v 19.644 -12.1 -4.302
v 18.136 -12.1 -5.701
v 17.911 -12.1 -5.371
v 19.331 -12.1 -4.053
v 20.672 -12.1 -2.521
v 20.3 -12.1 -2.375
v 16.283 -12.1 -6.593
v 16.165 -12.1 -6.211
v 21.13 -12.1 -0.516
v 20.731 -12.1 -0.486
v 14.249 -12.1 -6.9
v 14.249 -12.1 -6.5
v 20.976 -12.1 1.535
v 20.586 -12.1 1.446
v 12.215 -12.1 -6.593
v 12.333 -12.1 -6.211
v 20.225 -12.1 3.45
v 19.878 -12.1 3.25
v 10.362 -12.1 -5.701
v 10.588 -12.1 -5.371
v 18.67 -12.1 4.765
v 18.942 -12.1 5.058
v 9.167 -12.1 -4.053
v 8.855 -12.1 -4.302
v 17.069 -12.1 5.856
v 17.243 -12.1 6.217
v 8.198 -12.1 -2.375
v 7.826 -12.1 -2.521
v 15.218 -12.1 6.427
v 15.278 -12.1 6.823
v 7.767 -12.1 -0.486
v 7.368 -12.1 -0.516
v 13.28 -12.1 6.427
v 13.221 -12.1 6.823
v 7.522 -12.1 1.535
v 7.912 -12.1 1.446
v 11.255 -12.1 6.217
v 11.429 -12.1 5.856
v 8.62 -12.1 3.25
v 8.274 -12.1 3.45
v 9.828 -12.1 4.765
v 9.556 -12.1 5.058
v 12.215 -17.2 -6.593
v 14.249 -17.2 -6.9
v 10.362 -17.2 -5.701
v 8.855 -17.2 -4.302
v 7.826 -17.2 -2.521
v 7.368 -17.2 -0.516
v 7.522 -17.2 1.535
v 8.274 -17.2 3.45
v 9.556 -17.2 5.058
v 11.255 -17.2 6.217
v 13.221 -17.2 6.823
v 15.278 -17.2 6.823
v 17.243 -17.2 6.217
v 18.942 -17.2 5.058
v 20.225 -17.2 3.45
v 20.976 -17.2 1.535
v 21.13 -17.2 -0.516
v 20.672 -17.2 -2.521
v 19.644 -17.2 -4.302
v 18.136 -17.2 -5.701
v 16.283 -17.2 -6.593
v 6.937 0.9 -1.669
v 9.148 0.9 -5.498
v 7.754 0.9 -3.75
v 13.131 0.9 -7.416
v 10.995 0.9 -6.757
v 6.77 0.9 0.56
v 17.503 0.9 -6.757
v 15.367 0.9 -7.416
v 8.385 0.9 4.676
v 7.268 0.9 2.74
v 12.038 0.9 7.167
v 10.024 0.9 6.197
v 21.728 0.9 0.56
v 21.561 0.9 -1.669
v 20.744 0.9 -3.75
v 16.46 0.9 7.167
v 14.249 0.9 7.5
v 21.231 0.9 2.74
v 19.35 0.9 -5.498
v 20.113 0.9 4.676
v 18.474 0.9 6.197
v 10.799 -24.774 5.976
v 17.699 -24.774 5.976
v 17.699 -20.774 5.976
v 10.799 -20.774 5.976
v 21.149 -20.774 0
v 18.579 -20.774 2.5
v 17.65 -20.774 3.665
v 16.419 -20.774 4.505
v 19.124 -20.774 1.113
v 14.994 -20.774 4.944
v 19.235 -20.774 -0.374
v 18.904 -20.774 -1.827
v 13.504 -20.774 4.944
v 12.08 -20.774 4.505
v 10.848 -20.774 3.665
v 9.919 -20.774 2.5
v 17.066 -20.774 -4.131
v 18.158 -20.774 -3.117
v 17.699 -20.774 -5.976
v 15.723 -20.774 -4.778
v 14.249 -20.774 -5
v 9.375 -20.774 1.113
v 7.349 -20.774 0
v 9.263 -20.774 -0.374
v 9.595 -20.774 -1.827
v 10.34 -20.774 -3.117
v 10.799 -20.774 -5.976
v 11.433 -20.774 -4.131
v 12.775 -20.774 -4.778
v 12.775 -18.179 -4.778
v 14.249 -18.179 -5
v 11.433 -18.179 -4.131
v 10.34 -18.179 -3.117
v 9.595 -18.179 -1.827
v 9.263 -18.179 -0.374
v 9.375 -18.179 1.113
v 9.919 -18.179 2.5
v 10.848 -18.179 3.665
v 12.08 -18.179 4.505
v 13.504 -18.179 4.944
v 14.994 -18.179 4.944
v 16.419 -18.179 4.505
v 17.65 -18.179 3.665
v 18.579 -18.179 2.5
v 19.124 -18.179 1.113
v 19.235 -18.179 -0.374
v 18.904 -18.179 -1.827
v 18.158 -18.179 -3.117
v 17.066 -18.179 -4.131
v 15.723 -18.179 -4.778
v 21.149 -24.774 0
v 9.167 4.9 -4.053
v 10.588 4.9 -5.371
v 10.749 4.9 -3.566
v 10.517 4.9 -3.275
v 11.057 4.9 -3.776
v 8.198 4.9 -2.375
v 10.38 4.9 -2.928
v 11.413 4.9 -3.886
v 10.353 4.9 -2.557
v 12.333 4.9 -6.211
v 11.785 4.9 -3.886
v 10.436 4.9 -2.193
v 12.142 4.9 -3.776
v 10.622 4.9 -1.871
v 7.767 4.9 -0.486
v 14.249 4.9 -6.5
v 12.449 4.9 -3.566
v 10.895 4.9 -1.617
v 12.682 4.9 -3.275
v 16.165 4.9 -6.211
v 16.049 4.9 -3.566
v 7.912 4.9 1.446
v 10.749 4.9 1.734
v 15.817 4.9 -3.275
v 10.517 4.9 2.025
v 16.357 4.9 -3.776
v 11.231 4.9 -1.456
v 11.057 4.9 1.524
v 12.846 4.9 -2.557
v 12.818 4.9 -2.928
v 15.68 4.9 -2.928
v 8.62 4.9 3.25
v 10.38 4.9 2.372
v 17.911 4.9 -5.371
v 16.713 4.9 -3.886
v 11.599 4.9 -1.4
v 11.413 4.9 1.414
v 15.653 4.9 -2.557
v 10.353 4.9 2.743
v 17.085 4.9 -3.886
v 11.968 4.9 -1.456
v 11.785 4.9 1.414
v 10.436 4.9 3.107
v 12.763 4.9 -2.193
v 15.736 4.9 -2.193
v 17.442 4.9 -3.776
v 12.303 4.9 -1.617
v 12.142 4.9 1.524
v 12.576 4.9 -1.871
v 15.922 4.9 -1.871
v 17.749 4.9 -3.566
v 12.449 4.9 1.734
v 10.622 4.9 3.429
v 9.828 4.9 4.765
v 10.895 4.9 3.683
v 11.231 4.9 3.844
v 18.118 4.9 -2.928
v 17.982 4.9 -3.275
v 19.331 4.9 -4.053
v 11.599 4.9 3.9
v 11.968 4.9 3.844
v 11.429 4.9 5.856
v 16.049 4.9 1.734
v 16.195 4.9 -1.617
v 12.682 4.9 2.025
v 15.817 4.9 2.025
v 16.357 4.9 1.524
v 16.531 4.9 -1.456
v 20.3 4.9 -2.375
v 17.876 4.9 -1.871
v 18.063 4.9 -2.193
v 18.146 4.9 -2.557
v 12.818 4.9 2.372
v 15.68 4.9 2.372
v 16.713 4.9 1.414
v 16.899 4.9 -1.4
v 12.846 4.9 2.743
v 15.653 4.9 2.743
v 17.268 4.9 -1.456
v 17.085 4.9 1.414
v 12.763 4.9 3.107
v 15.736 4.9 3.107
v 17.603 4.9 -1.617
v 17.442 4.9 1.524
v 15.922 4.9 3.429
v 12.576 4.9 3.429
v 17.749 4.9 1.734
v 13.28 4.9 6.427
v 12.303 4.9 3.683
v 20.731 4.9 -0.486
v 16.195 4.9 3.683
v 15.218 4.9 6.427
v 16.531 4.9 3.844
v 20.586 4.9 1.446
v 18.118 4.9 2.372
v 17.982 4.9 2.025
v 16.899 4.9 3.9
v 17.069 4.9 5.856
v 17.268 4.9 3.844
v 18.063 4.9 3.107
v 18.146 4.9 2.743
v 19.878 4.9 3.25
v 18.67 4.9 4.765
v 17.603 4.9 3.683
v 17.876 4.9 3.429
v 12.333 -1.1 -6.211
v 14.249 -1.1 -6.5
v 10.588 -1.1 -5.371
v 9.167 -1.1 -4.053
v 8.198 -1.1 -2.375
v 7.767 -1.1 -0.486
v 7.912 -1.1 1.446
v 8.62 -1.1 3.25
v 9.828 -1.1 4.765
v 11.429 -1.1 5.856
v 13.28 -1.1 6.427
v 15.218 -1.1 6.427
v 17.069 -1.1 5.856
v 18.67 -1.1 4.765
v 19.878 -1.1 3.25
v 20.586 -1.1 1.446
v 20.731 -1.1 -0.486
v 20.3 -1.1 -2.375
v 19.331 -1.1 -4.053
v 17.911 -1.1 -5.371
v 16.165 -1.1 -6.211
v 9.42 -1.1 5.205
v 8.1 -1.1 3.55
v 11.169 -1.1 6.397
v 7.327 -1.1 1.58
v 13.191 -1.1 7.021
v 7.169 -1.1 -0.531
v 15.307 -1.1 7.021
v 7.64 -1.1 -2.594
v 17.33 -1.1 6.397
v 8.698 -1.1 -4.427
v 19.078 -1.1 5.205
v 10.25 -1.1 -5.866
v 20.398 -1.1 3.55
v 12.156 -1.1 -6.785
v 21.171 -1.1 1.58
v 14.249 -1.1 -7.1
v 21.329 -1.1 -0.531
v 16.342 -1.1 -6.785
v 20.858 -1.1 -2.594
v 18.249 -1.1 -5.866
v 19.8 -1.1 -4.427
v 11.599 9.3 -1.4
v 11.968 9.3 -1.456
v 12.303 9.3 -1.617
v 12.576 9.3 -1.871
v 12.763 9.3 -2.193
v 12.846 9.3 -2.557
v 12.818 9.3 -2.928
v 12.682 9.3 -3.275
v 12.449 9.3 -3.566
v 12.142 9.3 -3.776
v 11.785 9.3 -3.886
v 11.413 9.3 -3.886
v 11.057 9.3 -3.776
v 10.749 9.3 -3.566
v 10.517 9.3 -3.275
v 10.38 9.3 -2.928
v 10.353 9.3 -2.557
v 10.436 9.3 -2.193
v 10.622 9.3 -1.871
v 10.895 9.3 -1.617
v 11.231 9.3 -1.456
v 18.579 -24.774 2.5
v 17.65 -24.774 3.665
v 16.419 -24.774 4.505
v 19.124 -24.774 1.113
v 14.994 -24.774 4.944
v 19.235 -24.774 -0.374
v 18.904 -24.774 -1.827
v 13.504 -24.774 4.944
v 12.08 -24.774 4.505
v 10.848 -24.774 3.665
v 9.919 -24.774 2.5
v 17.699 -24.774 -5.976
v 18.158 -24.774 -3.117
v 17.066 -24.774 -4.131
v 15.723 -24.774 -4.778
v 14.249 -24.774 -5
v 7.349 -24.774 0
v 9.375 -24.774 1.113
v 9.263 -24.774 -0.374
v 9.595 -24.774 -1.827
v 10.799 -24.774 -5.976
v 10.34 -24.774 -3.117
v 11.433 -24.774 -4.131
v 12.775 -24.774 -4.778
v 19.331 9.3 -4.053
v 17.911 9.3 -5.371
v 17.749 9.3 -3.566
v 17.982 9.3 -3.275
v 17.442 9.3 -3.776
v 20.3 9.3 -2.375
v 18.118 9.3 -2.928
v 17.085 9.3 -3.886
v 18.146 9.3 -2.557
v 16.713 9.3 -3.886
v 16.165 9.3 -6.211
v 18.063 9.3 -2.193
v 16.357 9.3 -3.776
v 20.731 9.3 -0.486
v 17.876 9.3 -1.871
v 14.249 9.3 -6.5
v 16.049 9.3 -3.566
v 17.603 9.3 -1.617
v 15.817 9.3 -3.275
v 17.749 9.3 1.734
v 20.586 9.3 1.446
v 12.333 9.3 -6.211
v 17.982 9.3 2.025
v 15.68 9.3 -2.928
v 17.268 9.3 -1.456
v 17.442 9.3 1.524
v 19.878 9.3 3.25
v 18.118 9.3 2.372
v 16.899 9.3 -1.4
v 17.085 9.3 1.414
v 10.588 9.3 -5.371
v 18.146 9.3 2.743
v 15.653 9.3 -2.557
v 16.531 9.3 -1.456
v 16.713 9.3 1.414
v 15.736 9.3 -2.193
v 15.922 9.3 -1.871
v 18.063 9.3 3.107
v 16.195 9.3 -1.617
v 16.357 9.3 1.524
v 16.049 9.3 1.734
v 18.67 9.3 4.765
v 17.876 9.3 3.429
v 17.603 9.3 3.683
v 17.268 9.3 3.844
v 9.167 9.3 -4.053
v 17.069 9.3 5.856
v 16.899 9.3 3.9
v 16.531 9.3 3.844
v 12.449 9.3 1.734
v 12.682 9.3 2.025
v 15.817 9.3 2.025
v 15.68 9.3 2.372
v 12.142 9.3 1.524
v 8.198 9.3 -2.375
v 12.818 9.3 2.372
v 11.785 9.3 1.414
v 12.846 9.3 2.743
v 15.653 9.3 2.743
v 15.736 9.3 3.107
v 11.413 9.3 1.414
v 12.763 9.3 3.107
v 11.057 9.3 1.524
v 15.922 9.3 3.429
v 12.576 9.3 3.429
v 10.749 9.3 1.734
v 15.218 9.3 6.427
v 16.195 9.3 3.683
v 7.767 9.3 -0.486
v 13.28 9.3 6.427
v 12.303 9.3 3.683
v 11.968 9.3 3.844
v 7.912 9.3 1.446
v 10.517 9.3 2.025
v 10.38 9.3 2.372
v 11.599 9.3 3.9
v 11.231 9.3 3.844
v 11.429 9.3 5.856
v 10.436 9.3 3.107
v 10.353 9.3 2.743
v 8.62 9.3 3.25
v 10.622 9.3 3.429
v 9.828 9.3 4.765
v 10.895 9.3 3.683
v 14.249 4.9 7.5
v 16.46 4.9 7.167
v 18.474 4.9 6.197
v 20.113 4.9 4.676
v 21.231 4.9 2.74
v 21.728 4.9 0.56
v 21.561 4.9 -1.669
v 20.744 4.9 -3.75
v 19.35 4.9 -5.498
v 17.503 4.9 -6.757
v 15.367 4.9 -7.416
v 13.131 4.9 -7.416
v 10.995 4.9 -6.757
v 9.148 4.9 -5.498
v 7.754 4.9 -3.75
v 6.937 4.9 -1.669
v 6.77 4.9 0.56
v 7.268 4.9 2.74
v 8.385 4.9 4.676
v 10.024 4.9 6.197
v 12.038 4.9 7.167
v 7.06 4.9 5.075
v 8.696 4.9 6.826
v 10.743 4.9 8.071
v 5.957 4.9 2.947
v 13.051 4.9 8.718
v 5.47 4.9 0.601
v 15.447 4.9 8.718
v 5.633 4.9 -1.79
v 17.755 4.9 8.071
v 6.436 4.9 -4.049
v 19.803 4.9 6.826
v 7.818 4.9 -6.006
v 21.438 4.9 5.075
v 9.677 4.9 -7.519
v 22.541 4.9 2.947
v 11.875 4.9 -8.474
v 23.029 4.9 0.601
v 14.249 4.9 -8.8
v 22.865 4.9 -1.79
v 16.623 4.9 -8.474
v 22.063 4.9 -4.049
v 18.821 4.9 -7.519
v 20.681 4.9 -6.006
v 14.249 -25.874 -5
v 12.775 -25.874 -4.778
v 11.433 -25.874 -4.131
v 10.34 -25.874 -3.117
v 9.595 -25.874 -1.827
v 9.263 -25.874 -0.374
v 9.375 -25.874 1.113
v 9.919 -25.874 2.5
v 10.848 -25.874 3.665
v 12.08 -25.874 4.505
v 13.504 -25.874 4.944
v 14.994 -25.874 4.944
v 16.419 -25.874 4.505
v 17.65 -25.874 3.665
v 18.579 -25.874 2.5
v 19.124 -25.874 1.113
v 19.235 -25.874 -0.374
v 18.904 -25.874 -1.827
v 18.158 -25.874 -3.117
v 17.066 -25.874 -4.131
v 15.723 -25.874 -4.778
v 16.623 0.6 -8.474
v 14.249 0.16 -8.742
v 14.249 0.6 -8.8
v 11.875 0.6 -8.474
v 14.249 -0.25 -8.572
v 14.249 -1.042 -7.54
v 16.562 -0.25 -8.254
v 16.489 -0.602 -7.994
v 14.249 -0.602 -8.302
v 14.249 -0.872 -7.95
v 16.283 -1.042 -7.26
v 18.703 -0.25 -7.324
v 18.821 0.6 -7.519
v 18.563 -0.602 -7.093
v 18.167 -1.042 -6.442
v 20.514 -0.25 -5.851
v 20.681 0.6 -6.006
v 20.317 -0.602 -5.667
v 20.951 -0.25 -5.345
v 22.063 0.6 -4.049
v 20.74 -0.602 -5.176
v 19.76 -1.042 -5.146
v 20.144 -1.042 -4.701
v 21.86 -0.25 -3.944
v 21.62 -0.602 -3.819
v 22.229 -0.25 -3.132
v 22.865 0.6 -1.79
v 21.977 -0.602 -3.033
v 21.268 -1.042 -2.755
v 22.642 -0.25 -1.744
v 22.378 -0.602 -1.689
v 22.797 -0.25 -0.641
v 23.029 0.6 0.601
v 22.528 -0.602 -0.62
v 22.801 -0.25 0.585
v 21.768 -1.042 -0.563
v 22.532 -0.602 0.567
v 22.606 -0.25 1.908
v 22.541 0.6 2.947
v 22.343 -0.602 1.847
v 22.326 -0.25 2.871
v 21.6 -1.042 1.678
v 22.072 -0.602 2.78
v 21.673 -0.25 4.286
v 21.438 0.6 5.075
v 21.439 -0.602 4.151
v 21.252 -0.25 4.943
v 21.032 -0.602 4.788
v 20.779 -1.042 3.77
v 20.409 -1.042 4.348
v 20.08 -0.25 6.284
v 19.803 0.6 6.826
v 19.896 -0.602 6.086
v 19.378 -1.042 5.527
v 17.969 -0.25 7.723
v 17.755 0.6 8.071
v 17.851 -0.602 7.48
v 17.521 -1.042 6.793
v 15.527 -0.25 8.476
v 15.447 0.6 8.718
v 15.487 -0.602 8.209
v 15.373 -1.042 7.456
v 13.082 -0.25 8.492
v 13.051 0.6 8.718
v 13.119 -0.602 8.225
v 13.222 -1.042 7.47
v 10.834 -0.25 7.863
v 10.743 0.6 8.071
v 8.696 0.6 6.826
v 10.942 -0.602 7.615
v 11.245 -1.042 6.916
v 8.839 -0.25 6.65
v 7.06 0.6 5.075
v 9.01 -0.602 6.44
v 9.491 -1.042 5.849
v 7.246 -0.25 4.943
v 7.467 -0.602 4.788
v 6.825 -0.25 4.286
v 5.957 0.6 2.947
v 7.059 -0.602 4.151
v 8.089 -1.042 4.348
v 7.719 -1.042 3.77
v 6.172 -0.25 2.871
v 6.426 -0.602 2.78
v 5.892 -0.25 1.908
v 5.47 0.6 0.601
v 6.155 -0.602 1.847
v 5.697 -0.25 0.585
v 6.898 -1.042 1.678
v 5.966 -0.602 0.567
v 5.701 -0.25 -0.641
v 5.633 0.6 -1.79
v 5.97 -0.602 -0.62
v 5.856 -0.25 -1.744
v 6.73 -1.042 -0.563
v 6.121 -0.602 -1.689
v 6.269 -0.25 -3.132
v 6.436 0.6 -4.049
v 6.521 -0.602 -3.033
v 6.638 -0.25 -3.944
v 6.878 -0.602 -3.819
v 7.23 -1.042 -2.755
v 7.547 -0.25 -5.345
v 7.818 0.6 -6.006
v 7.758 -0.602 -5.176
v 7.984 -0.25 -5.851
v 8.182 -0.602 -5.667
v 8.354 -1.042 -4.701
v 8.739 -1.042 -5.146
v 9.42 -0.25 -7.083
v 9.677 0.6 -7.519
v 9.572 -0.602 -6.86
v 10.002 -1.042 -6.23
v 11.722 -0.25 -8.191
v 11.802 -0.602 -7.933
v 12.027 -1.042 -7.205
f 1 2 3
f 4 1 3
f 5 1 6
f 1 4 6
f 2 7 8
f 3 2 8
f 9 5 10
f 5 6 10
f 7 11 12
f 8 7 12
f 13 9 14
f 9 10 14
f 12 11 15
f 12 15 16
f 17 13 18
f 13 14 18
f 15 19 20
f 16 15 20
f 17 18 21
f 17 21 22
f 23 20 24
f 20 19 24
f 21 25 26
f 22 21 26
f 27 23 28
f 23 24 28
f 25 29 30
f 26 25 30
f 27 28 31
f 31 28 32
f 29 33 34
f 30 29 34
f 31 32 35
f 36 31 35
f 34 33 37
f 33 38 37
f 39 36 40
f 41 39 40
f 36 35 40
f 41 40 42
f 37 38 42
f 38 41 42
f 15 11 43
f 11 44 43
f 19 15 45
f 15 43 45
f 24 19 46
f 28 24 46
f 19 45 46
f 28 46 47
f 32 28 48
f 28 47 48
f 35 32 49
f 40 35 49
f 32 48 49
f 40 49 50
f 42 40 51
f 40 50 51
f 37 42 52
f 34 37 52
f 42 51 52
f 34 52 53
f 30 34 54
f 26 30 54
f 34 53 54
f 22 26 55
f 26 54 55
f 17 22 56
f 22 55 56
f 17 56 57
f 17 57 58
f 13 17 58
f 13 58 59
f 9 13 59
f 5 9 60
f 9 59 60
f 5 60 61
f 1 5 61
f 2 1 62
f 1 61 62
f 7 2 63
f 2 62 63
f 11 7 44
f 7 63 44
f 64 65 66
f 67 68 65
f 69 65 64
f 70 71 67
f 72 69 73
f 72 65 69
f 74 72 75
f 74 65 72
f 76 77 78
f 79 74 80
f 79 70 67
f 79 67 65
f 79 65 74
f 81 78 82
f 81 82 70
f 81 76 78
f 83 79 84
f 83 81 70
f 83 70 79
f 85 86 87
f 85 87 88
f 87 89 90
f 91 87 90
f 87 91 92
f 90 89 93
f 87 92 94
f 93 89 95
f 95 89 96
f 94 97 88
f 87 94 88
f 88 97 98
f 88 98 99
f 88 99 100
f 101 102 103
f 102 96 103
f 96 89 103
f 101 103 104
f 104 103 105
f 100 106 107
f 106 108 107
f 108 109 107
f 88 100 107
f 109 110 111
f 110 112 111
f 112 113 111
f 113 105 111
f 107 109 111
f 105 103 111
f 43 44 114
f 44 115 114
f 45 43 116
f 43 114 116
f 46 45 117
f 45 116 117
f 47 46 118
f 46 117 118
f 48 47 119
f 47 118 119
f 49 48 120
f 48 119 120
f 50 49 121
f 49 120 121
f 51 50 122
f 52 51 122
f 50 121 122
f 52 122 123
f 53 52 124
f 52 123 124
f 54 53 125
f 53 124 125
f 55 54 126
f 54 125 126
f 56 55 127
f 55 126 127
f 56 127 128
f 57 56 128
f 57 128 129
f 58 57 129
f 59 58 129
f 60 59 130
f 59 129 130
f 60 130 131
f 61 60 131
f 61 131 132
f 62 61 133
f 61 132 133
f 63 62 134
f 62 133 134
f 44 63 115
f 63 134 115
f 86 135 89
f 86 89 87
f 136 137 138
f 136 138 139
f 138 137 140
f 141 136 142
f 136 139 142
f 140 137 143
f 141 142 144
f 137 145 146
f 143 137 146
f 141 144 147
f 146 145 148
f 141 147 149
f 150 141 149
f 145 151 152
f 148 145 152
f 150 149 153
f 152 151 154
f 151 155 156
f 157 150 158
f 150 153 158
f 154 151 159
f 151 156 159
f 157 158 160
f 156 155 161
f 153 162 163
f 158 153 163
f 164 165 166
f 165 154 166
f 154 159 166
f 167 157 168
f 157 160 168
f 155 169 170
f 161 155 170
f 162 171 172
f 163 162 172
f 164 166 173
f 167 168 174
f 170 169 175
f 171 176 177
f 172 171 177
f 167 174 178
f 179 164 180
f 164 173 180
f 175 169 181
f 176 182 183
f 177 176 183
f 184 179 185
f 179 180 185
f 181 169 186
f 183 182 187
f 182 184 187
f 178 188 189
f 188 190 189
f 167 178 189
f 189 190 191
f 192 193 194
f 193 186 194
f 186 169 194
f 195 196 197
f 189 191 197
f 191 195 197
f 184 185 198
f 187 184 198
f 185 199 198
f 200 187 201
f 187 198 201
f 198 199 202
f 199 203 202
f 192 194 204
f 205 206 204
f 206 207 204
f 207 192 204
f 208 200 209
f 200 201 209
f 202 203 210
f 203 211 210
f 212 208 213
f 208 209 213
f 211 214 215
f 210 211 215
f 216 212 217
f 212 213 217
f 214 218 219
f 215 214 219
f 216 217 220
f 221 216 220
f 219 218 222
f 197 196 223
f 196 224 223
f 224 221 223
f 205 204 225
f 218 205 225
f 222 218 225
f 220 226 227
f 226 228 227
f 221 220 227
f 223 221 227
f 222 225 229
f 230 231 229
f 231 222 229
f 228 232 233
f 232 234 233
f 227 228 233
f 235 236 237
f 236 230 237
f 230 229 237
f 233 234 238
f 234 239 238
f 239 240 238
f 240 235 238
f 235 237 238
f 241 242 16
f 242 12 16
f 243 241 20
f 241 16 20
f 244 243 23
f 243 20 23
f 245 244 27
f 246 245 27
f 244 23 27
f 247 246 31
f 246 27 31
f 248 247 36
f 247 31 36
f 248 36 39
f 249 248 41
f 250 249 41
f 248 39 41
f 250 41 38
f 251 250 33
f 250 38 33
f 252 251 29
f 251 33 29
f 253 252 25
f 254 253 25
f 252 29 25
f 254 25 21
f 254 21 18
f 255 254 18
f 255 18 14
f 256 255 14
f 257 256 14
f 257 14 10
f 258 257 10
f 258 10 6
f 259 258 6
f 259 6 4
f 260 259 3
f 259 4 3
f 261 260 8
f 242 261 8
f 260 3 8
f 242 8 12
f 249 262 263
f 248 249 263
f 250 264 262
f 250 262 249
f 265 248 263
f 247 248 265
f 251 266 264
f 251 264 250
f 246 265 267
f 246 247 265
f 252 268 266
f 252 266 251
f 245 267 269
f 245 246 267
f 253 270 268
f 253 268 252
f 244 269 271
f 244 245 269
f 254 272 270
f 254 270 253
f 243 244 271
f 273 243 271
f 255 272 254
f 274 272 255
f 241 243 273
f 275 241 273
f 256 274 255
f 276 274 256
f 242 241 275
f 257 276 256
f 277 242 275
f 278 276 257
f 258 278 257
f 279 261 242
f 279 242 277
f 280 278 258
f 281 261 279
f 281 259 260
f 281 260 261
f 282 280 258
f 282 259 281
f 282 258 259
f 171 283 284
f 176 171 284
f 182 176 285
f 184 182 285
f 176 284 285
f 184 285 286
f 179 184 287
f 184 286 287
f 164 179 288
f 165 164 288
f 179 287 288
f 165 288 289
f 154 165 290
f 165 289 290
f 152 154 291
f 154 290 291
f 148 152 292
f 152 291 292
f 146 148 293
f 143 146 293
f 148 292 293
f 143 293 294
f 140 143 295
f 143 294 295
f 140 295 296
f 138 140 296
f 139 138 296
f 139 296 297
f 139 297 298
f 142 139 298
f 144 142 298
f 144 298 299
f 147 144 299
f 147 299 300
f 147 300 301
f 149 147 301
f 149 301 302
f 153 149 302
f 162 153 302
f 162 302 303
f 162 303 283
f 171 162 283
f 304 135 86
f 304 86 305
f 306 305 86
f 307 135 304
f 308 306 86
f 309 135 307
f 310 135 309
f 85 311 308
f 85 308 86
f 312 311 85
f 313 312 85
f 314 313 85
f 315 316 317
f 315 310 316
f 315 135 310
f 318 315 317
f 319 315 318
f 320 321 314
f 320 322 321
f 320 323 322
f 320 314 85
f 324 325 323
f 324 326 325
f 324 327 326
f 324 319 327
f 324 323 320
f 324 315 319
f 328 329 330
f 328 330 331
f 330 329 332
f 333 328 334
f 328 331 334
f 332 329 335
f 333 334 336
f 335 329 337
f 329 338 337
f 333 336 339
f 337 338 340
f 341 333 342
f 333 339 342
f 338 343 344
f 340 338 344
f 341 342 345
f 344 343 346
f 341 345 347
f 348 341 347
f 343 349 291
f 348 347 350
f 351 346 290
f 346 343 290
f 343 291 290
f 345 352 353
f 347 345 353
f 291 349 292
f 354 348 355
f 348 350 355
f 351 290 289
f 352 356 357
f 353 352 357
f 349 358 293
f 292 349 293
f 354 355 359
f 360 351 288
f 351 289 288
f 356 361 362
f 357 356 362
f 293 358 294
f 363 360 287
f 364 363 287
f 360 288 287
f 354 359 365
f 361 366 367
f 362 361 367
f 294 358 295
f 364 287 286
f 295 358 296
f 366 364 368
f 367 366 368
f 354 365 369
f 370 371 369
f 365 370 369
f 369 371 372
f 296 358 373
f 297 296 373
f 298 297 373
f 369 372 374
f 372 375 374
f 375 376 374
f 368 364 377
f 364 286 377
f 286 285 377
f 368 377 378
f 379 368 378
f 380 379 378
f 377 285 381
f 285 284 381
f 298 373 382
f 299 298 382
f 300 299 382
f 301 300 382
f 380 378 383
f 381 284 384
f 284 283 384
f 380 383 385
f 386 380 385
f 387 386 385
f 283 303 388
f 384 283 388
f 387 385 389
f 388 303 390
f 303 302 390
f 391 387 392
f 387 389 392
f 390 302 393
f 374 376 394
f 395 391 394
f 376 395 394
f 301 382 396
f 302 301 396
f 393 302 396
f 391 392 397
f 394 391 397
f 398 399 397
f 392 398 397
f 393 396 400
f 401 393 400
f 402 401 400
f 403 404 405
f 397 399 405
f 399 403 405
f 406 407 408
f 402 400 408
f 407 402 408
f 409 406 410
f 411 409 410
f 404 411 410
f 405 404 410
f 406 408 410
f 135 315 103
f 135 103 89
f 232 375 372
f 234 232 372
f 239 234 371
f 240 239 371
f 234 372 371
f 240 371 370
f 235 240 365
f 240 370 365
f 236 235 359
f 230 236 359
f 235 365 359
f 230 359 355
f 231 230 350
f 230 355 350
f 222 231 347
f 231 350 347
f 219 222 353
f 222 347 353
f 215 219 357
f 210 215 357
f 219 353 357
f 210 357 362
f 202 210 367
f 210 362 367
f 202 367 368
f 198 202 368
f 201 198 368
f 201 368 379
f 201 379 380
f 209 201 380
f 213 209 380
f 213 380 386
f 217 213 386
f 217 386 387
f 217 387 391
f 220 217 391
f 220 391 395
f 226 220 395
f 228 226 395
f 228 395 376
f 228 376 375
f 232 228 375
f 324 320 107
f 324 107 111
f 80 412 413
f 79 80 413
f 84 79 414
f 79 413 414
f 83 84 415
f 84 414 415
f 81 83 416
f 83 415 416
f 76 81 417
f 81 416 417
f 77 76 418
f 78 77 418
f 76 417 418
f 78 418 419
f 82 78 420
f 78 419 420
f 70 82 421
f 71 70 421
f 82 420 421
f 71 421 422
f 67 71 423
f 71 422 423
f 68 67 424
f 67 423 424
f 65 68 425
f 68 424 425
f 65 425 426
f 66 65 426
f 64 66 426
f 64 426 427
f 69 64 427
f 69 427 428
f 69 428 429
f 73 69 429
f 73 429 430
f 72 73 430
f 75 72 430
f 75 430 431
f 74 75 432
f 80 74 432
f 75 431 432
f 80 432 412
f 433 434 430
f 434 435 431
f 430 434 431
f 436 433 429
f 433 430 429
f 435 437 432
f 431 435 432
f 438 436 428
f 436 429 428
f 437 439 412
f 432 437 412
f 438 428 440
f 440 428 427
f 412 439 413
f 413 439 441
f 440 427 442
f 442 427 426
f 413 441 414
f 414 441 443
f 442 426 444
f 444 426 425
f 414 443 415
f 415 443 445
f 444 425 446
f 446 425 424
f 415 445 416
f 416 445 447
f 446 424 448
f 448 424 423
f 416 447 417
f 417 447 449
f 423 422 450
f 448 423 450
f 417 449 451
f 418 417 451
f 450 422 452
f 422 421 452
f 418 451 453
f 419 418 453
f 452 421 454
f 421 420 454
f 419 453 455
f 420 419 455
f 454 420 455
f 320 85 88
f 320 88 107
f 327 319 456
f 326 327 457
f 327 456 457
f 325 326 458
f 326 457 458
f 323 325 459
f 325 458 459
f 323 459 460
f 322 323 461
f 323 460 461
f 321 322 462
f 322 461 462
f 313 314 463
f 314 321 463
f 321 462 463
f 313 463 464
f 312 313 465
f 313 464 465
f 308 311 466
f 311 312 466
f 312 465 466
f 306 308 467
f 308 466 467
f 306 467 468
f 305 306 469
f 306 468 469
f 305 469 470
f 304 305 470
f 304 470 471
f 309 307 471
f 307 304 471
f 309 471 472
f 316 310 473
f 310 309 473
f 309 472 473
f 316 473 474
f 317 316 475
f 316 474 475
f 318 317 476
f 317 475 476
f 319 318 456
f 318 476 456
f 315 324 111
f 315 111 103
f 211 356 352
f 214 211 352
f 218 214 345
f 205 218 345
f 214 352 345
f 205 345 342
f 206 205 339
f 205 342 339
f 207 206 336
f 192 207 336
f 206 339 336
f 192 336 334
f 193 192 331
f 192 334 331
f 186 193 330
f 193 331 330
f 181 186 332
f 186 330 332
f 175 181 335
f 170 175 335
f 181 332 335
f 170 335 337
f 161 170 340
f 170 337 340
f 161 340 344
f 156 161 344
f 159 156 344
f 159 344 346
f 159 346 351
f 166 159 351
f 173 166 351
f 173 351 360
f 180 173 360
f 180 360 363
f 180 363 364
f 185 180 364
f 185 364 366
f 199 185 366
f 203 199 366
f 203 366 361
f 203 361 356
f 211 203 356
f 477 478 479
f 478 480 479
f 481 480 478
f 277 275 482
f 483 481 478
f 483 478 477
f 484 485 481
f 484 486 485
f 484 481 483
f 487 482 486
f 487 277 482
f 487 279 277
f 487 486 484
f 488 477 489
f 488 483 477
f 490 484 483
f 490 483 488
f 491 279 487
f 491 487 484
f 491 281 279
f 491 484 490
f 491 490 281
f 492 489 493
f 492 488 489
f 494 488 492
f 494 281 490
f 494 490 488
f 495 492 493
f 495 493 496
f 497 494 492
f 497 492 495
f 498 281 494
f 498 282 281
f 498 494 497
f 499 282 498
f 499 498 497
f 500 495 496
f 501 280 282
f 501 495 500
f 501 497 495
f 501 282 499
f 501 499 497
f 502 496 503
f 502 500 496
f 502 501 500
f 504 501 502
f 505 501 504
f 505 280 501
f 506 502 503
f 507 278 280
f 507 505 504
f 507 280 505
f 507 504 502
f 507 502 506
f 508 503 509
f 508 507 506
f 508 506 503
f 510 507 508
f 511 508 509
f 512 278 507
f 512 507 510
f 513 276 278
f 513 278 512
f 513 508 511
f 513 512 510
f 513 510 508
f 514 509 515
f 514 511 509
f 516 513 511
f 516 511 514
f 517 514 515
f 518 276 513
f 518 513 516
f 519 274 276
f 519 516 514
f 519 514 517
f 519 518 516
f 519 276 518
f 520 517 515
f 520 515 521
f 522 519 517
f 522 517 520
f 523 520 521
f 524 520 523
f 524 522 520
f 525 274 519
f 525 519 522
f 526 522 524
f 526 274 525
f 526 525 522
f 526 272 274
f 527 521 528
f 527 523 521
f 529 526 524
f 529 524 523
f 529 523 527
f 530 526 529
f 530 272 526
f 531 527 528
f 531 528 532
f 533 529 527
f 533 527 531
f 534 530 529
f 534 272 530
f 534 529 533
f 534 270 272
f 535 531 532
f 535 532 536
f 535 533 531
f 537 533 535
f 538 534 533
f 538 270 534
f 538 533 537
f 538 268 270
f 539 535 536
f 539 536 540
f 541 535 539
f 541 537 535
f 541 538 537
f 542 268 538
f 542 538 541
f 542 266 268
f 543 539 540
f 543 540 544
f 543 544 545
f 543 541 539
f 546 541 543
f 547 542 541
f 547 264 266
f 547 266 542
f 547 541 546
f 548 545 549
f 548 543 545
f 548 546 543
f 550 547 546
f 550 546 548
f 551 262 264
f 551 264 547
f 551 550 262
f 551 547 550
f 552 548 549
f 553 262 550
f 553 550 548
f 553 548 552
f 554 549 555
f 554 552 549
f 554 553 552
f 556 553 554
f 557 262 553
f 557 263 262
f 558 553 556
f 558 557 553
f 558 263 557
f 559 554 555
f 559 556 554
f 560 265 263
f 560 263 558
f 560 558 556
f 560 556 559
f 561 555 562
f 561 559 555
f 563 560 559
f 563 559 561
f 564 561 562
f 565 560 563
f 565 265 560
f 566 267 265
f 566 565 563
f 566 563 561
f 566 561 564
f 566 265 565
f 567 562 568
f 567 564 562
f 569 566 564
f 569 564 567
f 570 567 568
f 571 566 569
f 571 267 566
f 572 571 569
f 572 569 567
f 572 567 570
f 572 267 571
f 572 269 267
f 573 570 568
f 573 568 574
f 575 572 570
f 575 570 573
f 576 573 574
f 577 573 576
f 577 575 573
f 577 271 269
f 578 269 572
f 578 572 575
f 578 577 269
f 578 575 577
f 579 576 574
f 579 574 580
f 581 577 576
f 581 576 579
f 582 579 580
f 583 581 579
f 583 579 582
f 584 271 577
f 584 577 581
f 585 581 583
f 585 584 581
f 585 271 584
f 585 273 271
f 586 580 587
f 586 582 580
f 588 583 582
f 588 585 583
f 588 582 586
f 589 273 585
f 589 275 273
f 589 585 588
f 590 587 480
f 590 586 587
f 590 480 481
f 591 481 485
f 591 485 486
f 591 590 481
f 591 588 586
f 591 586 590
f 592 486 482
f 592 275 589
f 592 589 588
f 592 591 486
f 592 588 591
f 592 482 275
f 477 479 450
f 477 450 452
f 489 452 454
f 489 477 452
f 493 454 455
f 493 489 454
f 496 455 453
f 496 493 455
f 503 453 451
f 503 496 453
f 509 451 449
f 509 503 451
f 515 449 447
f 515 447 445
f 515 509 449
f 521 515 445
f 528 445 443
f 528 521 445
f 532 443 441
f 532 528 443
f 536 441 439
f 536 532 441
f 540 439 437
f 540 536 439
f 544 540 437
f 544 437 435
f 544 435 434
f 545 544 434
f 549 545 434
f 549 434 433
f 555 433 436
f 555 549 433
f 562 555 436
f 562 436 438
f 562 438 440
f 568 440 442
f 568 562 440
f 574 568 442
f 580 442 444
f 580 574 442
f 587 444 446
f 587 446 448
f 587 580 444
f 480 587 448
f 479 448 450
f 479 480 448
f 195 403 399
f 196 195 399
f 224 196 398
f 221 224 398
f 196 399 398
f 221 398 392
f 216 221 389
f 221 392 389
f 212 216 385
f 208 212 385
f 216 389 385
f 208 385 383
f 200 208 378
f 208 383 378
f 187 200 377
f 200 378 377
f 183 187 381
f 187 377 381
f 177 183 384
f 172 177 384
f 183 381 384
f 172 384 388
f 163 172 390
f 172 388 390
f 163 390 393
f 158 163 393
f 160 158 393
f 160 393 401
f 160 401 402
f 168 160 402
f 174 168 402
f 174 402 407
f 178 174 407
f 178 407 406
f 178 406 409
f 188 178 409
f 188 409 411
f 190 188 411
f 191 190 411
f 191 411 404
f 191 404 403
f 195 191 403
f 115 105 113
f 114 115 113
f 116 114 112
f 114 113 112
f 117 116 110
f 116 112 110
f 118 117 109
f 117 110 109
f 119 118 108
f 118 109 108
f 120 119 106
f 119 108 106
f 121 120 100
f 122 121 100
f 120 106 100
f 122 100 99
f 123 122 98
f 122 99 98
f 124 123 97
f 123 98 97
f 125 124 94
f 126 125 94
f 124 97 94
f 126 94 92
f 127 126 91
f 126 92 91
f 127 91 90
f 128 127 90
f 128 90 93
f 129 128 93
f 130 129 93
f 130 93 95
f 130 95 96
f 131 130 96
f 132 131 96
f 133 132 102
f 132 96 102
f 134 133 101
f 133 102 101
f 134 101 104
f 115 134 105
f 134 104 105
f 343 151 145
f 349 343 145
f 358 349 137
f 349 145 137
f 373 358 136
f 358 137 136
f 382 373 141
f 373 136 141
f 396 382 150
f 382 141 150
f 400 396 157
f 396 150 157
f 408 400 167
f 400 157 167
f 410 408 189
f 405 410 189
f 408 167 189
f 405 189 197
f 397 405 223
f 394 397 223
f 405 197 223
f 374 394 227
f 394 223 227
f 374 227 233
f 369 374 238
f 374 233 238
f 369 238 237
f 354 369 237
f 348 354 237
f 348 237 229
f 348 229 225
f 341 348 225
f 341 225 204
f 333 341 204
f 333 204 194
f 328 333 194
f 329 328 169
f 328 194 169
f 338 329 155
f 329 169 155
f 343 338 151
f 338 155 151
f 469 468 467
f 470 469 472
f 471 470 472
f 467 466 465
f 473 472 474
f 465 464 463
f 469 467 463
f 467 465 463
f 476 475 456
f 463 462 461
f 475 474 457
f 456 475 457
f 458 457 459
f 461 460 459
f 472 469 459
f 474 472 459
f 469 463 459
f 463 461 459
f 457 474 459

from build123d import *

# Parameters (mm, degrees)
SZKIC19_R                   = 1.25
WYTNIJ_WYCI_GNI_CIE2_DEPTH  = 6
DODANIE_WYCI_GNI_CIE1_DEPTH = 4
SZKIC21_R                   = 8.8
DODANIE_WYCI_GNI_CIE2_DEPTH = 6
ZAOKR_GLENIE1_R             = 1.7
SZKIC22_R                   = 7.5
WYTNIJ_WYCI_GNI_CIE3_DEPTH  = 4


with BuildPart() as part:
    # Szkic18 → Obrót4 (revolve)
    with BuildSketch(Plane.XY, mode=Mode.PRIVATE) as obr_t4_sk:
        Polygon((14.249151908, 9.3), (20.749151908, 9.3), (20.749151908, 0), (21.499151908, 0), (21.499151908, -1.1), (20.749151908, -1.1), (20.749151908, -12.1), (21.149151908, -12.1), (21.149151908, -17.2), (19.249151908, -18.17860252), (19.249151908, -25.873716184), (14.249151908, -25.873716184), align=None)
    revolve(obr_t4_sk.sketch.rotate(Axis((14.249151908, -25.873716184, 0), (0, 1, 0)), 90), axis=Axis((14.249151908, -25.873716184, 0), (0, 1, 0)))

    # Szkic19 → Wytnij-wyciągnięcie2 (cut)
    with BuildSketch(Plane(origin=(0, 9.3, 0), x_dir=(1, 0, 0), z_dir=(0, 1, 0))):
        with Locations(Location((11.599151908, 2.65, 0), (0, 0, 270))):
            Circle(SZKIC19_R)
        with Locations(Location((16.899151908, 2.65, 0), (0, 0, 270))):
            Circle(SZKIC19_R)
        with Locations(Location((16.899151908, -2.65, 0), (0, 0, 270))):
            Circle(SZKIC19_R)
        with Locations(Location((11.599151908, -2.65, 0), (0, 0, 270))):
            Circle(SZKIC19_R)
    extrude(amount=-WYTNIJ_WYCI_GNI_CIE2_DEPTH, mode=Mode.SUBTRACT)

    # Szkic20 → Dodanie-wyciągnięcie1 (add)
    with BuildSketch(Plane(origin=(0, -24.773716184, 0), x_dir=(-1, 0, 0), z_dir=(0, -1, 0))):
        Polygon((-7.349151908, 0), (-10.799151908, 5.975575286), (-17.699151908, 5.975575286), (-21.149151908, 0), (-17.699151908, -5.975575286), (-10.799151908, -5.975575286), align=None)
    extrude(amount=-DODANIE_WYCI_GNI_CIE1_DEPTH)

    # Szkic21 → Dodanie-wyciągnięcie2 (add)
    with BuildSketch(Plane.XZ.offset(1.1)):
        with Locations(Location((14.249151908, 0, 0), (0, 0, 270))):
            Circle(SZKIC21_R)
    extrude(amount=-DODANIE_WYCI_GNI_CIE2_DEPTH)

    # Zaokrąglenie1
    zaokr_glenie1_edges = [part.edges().sort_by_distance(p)[0] for p in [
        (14.249151908, -1.1, 8.8),
    ]]
    fillet(zaokr_glenie1_edges, radius=ZAOKR_GLENIE1_R)

    # Szkic22 → Wytnij-wyciągnięcie3 (cut)
    with BuildSketch(Plane(origin=(0, 4.9, 0), x_dir=(1, 0, 0), z_dir=(0, 1, 0))):
        with Locations(Location((14.249151908, 0, 0), (0, 0, 270))):
            Circle(SZKIC22_R)
    extrude(amount=-WYTNIJ_WYCI_GNI_CIE3_DEPTH, mode=Mode.SUBTRACT)


with BuildPart() as wytnij_wyci_gni_cie3_piece_1:
    # of the separate pieces the step leaves, piece 1, a body of its own (wytnij_wyci_gni_cie3_pieces)
    add(part.part.solids().sort_by_distance((14.249151908, 0.6, -8.8))[0])


with BuildPart() as wytnij_wyci_gni_cie3_piece_2:
    # of the separate pieces the step leaves, piece 2, a body of its own (wytnij_wyci_gni_cie3_pieces)
    add(part.part.solids().sort_by_distance((14.249151908, 9.3, -6.5))[0])


solid = Compound([wytnij_wyci_gni_cie3_piece_1.part, wytnij_wyci_gni_cie3_piece_2.part])
